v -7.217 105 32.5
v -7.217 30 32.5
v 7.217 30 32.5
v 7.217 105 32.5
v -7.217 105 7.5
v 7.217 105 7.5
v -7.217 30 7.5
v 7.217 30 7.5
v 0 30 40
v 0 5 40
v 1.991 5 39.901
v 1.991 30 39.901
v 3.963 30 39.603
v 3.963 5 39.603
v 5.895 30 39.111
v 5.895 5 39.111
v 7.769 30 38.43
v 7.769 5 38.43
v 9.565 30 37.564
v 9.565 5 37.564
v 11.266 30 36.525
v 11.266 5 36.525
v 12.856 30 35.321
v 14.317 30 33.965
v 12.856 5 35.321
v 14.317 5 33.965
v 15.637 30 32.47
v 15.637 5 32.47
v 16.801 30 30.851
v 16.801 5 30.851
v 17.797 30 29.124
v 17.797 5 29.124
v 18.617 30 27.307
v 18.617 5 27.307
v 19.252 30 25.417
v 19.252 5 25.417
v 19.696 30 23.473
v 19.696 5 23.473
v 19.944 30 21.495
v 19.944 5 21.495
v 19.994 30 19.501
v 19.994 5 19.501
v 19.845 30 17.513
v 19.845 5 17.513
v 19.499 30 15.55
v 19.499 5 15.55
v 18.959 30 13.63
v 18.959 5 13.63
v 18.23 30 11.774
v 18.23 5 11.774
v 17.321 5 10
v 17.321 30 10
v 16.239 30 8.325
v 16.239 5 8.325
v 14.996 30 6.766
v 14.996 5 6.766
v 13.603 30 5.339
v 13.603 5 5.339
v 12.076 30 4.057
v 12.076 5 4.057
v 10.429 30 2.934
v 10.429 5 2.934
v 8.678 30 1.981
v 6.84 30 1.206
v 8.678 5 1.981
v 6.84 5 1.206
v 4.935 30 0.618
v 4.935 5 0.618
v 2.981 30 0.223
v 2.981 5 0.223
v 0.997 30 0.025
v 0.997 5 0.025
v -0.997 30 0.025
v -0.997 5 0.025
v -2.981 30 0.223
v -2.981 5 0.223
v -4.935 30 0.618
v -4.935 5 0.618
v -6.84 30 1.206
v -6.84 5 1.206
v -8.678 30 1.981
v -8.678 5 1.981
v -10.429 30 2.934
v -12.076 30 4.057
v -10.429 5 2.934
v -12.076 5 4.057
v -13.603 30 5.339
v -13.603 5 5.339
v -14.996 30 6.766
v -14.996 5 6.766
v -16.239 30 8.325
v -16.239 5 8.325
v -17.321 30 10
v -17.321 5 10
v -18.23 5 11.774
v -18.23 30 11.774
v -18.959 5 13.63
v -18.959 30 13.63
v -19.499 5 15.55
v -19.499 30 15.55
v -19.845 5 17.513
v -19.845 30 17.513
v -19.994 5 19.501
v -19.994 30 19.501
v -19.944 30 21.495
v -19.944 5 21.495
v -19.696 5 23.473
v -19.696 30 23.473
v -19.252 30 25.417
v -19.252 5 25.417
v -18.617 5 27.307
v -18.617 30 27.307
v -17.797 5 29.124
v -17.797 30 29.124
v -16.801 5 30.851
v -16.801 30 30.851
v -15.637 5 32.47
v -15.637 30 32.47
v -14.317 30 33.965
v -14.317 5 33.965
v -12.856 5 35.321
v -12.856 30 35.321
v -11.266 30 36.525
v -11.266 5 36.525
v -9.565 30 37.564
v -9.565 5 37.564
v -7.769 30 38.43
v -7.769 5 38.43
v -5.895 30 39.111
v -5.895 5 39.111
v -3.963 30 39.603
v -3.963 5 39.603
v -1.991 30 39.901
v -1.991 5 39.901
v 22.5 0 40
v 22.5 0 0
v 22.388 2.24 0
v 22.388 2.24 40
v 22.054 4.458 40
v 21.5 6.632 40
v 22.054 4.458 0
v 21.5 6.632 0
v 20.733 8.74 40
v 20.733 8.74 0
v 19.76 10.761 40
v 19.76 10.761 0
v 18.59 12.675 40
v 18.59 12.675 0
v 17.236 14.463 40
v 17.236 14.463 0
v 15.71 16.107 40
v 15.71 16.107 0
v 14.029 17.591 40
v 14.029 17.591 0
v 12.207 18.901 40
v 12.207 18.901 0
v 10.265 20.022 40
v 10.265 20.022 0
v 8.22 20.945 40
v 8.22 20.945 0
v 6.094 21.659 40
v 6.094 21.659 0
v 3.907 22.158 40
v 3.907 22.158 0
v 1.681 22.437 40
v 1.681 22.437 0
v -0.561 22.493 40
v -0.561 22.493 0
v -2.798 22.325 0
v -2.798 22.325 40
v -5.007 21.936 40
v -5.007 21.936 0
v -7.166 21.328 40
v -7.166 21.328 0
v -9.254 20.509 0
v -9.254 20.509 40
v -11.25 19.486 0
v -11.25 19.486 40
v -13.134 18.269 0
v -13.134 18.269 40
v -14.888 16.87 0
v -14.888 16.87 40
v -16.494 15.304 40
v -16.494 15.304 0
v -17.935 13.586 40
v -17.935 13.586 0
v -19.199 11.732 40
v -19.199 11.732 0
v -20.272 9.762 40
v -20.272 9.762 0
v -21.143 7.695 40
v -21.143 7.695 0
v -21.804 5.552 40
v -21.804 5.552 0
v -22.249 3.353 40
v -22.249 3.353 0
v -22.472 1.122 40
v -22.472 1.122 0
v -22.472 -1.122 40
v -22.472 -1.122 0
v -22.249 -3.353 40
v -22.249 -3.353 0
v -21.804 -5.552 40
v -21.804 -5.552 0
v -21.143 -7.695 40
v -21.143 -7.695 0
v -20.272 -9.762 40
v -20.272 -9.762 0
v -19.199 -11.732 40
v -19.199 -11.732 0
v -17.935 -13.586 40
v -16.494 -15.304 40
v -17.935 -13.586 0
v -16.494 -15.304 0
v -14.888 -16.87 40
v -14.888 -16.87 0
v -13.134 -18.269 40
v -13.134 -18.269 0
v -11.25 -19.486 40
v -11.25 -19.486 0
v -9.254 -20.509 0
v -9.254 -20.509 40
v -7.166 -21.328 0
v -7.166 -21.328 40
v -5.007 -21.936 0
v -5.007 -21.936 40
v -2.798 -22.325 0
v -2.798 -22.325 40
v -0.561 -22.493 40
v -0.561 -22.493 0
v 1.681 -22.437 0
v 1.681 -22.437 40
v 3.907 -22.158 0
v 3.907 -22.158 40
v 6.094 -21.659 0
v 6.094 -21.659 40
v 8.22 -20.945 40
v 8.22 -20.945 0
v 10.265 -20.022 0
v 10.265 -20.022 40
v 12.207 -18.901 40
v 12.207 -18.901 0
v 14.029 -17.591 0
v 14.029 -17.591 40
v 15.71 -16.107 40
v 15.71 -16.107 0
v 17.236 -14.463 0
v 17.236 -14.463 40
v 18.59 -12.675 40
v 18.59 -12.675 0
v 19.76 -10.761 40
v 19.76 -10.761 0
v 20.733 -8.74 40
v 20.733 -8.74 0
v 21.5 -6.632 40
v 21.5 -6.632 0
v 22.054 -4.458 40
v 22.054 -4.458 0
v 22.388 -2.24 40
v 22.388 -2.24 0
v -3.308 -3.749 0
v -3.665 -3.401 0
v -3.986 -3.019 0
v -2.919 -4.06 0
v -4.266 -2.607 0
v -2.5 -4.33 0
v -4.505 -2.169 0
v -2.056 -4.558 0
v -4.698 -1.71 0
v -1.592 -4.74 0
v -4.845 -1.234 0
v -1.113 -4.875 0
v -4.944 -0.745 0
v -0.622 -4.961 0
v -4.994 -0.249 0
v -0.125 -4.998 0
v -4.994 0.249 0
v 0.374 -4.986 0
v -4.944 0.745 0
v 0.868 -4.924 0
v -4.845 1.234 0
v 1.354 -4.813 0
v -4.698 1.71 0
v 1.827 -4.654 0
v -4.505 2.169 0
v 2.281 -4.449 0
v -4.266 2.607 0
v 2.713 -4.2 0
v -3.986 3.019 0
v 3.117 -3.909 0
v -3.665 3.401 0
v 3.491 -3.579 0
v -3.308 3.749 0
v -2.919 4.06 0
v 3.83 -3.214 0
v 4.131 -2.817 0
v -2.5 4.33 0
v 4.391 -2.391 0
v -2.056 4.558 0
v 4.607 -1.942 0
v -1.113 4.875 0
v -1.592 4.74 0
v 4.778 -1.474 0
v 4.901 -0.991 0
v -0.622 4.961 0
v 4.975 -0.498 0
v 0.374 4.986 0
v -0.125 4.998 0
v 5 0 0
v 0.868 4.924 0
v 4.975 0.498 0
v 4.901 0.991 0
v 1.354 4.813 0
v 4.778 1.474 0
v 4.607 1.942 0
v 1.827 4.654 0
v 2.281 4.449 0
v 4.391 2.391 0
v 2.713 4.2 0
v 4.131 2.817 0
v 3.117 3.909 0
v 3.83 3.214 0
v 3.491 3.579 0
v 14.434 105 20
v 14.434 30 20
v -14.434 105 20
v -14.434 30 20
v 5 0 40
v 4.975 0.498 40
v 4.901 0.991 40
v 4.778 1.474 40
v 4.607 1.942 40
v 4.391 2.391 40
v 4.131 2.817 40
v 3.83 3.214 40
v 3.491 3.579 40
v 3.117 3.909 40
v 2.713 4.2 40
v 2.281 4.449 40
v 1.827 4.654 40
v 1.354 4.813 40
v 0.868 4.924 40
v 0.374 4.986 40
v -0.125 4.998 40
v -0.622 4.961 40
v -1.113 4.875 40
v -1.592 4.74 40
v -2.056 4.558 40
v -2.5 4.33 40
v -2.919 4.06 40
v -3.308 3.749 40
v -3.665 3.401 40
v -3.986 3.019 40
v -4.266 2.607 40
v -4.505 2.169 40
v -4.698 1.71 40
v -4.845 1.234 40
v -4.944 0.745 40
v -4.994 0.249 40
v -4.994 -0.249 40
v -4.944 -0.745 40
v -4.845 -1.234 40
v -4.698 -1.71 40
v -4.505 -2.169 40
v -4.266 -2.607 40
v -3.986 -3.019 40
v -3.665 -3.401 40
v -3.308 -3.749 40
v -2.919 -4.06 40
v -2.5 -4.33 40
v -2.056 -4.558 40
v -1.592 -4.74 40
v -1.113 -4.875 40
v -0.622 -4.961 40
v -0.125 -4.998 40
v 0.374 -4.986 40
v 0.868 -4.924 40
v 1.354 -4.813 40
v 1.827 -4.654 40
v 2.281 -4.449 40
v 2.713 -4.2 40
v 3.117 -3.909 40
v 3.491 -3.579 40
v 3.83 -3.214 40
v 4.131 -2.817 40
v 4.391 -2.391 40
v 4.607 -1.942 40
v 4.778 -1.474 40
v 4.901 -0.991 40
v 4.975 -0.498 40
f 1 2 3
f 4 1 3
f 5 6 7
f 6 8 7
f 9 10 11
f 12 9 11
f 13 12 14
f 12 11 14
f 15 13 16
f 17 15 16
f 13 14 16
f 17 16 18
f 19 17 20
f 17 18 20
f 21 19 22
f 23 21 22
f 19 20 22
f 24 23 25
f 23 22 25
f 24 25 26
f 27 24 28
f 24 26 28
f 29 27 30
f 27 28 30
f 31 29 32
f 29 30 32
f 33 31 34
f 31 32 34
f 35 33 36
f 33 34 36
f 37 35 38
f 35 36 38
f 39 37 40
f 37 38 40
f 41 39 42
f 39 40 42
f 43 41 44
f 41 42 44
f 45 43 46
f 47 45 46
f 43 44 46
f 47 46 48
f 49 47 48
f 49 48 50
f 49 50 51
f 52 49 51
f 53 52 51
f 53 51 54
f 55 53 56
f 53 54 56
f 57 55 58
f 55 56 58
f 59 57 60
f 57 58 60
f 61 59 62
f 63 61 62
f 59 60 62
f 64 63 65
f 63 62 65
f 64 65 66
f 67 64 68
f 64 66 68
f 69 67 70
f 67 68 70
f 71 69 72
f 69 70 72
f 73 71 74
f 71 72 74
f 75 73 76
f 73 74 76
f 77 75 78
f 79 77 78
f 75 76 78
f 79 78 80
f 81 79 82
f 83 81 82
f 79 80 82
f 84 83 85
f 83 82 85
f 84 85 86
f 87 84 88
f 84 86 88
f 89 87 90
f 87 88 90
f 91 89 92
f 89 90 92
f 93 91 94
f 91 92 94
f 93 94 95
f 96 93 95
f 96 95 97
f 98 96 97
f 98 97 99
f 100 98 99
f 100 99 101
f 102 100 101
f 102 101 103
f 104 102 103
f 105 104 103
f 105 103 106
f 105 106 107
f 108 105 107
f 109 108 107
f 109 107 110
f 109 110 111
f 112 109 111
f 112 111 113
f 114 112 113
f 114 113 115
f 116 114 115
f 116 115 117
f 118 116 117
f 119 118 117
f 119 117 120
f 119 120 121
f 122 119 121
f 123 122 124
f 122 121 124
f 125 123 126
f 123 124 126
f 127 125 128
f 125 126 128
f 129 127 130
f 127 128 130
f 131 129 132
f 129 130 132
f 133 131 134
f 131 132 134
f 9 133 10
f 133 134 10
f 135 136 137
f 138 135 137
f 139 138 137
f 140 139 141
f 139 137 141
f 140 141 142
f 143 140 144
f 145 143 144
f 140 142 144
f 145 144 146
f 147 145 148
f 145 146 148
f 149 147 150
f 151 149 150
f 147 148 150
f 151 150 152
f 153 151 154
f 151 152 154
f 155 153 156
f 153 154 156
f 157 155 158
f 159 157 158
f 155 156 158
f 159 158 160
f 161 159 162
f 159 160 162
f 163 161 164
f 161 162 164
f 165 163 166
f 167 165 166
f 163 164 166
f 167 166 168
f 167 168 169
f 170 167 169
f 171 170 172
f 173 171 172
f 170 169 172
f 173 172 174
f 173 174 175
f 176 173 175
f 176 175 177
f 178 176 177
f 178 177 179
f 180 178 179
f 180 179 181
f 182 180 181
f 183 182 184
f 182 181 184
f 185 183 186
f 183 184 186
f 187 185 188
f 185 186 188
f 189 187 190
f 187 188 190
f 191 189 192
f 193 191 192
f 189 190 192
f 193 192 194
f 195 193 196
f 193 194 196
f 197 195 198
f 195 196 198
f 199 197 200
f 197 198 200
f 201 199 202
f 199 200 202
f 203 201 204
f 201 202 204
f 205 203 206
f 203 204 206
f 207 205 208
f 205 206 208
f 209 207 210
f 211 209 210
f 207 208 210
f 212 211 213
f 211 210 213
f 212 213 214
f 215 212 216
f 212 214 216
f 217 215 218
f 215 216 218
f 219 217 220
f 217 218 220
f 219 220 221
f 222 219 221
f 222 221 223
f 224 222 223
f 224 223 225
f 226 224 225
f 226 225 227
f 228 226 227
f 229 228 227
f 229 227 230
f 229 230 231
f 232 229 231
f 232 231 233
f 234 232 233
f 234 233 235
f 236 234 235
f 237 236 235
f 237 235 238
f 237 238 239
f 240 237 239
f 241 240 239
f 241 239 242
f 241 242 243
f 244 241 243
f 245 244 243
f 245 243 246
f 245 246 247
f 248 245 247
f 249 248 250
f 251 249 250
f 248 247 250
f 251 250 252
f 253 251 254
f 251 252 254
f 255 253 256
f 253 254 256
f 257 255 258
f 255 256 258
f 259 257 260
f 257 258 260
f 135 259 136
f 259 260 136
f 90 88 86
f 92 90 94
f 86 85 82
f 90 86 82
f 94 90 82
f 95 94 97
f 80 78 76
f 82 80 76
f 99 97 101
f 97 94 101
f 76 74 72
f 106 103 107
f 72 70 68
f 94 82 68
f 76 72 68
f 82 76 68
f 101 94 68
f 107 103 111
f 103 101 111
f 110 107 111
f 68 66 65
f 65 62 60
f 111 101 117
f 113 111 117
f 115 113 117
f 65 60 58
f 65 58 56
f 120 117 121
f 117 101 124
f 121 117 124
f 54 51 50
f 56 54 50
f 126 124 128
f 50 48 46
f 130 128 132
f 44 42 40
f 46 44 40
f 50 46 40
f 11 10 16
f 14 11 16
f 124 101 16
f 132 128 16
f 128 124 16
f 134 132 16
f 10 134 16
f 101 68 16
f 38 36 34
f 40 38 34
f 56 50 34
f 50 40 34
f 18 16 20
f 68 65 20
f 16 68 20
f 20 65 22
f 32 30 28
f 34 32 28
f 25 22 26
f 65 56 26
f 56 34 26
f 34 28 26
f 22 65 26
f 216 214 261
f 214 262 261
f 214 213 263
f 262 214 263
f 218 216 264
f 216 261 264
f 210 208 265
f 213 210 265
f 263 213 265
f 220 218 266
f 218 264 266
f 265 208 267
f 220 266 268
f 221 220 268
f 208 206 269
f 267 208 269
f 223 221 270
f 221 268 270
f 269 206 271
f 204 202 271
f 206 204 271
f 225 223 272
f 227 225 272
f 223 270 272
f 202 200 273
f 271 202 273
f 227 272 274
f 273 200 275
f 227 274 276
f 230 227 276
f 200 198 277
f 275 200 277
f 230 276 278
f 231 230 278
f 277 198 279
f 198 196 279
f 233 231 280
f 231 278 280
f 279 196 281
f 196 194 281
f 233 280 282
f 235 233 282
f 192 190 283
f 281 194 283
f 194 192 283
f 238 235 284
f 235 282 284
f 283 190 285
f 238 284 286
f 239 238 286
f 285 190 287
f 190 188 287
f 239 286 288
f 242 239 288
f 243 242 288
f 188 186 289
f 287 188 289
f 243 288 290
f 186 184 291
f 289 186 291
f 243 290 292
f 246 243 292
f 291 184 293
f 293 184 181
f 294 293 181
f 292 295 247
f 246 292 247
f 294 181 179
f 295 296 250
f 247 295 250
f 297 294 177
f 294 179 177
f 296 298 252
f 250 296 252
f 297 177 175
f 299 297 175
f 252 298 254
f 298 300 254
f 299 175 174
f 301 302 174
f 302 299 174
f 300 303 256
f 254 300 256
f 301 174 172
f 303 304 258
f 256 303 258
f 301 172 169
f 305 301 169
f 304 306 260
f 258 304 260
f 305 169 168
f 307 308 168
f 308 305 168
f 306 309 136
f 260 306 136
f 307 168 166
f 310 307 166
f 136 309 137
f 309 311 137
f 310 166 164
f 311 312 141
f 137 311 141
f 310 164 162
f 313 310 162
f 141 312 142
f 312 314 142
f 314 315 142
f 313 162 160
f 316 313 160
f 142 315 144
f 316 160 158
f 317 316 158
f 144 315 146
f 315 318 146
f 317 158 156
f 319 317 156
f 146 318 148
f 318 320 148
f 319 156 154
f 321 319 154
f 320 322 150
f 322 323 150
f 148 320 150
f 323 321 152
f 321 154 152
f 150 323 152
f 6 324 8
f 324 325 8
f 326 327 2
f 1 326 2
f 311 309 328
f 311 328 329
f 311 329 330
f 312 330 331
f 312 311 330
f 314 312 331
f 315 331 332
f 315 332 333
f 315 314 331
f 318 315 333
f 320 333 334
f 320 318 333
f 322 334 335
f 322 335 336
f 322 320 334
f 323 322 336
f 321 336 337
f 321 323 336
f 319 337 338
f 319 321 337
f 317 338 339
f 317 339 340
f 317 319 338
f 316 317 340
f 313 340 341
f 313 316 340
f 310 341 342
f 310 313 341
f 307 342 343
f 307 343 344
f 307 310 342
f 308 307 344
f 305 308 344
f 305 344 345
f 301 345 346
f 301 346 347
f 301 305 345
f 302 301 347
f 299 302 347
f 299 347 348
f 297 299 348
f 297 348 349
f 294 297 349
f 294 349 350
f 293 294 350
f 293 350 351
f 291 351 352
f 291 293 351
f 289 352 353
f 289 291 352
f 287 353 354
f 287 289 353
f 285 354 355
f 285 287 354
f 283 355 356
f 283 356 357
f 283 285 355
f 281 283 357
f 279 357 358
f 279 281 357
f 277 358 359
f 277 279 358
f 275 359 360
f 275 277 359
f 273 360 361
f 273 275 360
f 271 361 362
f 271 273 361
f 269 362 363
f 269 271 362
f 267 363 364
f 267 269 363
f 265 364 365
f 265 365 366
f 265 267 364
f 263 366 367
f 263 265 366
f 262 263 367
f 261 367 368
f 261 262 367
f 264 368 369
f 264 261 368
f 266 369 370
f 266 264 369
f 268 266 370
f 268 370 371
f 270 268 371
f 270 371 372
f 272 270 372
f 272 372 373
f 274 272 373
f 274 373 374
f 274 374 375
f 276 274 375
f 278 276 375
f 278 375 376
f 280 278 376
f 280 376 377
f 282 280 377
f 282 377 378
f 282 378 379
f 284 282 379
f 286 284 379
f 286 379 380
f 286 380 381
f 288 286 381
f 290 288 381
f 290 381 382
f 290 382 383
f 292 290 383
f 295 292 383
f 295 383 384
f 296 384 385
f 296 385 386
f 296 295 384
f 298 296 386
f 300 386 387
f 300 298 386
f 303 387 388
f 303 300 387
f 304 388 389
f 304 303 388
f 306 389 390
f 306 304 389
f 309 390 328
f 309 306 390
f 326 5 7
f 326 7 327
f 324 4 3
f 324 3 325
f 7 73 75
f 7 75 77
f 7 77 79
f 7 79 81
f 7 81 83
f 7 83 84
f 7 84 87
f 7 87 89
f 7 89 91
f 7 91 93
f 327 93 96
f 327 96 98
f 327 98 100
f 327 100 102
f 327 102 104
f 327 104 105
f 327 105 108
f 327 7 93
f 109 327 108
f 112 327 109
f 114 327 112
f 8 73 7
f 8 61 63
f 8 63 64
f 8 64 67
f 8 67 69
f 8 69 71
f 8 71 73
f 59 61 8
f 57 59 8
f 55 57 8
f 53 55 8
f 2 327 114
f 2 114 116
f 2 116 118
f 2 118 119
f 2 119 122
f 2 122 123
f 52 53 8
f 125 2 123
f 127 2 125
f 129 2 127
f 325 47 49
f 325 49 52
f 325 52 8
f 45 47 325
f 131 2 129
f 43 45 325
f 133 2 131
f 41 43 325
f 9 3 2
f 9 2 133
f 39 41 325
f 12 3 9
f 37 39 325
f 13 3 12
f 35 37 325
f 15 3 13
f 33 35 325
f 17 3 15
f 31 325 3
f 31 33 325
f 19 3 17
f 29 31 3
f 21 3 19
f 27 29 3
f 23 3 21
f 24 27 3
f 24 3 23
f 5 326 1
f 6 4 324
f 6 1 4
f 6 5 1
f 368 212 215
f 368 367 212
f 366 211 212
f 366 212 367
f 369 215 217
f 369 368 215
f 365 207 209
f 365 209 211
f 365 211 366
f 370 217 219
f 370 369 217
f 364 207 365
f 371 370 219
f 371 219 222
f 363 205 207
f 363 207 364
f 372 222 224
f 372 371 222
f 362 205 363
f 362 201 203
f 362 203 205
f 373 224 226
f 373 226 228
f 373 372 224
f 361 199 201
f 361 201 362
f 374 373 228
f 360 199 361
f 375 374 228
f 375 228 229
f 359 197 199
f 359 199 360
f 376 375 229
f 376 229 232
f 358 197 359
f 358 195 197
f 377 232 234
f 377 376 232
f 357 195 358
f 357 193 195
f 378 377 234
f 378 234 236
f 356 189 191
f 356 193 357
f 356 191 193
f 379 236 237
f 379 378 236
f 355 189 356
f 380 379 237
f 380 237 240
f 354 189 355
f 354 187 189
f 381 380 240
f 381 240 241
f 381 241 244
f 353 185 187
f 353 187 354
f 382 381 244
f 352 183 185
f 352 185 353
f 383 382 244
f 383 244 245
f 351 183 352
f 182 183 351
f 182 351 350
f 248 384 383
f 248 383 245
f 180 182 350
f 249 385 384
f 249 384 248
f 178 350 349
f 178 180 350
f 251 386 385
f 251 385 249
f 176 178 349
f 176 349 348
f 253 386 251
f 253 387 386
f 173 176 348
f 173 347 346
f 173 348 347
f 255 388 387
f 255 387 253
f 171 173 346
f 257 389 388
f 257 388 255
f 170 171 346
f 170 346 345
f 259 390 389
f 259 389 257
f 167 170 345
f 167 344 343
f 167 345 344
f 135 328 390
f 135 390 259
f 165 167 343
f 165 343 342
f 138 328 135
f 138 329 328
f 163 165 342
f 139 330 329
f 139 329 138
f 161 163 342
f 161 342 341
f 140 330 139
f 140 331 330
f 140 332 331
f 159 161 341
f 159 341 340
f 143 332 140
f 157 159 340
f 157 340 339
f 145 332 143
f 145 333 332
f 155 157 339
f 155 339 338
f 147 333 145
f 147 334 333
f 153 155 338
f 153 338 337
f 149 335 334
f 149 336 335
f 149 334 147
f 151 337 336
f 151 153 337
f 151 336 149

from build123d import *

# Parameters (mm, degrees)
SKETCH1_R           = 22.5
SKETCH1_R_2         = 5
BOSS_EXTRUDE1_DEPTH = 40
SKETCH2_R           = 20
BOSS_EXTRUDE2_DEPTH = 25
BOSS_EXTRUDE3_DEPTH = 25
BOSS_EXTRUDE4_DEPTH = 50


with BuildPart() as part:
    # Sketch1 → Boss-Extrude1 (new body)
    with BuildSketch(Plane.XY):
        Circle(SKETCH1_R)
        Circle(SKETCH1_R_2, mode=Mode.SUBTRACT)
    extrude(amount=BOSS_EXTRUDE1_DEPTH)


with BuildPart() as body_2:
    # Sketch2 → Boss-Extrude2 (new body)
    with BuildSketch(Plane(origin=(0, 5, 0), x_dir=(1, 0, 0), z_dir=(0, 1, 0))):
        with Locations(Location((0, -20, 0), (0, 0, 270))):
            Circle(SKETCH2_R)
    extrude(amount=BOSS_EXTRUDE2_DEPTH)

    # Sketch3 → Boss-Extrude3 (add)
    with BuildSketch(Plane(origin=(0, 30, 0), x_dir=(1, 0, 0), z_dir=(0, 1, 0))):
        Polygon((0, -20), (0, -7.5), (-7.216878365, -7.5), (-14.43375673, -20), (-7.216878365, -32.5), (7.216878365, -32.5), (14.43375673, -20), align=None)
        Polygon((7.216878365, -7.5), (0, -7.5), (0, -20), (14.43375673, -20), align=None)
    extrude(amount=BOSS_EXTRUDE3_DEPTH)

    # Sketch4 → Boss-Extrude4 (add)
    with BuildSketch(Plane(origin=(0, 55, 0), x_dir=(1, 0, 0), z_dir=(0, 1, 0))):
        Polygon((7.216878365, -32.5), (14.43375673, -20), (7.216878365, -7.5), (-7.216878365, -7.5), (-14.43375673, -20), (-7.216878365, -32.5), align=None)
    extrude(amount=BOSS_EXTRUDE4_DEPTH)


solid = Compound([part.part, body_2.part])
